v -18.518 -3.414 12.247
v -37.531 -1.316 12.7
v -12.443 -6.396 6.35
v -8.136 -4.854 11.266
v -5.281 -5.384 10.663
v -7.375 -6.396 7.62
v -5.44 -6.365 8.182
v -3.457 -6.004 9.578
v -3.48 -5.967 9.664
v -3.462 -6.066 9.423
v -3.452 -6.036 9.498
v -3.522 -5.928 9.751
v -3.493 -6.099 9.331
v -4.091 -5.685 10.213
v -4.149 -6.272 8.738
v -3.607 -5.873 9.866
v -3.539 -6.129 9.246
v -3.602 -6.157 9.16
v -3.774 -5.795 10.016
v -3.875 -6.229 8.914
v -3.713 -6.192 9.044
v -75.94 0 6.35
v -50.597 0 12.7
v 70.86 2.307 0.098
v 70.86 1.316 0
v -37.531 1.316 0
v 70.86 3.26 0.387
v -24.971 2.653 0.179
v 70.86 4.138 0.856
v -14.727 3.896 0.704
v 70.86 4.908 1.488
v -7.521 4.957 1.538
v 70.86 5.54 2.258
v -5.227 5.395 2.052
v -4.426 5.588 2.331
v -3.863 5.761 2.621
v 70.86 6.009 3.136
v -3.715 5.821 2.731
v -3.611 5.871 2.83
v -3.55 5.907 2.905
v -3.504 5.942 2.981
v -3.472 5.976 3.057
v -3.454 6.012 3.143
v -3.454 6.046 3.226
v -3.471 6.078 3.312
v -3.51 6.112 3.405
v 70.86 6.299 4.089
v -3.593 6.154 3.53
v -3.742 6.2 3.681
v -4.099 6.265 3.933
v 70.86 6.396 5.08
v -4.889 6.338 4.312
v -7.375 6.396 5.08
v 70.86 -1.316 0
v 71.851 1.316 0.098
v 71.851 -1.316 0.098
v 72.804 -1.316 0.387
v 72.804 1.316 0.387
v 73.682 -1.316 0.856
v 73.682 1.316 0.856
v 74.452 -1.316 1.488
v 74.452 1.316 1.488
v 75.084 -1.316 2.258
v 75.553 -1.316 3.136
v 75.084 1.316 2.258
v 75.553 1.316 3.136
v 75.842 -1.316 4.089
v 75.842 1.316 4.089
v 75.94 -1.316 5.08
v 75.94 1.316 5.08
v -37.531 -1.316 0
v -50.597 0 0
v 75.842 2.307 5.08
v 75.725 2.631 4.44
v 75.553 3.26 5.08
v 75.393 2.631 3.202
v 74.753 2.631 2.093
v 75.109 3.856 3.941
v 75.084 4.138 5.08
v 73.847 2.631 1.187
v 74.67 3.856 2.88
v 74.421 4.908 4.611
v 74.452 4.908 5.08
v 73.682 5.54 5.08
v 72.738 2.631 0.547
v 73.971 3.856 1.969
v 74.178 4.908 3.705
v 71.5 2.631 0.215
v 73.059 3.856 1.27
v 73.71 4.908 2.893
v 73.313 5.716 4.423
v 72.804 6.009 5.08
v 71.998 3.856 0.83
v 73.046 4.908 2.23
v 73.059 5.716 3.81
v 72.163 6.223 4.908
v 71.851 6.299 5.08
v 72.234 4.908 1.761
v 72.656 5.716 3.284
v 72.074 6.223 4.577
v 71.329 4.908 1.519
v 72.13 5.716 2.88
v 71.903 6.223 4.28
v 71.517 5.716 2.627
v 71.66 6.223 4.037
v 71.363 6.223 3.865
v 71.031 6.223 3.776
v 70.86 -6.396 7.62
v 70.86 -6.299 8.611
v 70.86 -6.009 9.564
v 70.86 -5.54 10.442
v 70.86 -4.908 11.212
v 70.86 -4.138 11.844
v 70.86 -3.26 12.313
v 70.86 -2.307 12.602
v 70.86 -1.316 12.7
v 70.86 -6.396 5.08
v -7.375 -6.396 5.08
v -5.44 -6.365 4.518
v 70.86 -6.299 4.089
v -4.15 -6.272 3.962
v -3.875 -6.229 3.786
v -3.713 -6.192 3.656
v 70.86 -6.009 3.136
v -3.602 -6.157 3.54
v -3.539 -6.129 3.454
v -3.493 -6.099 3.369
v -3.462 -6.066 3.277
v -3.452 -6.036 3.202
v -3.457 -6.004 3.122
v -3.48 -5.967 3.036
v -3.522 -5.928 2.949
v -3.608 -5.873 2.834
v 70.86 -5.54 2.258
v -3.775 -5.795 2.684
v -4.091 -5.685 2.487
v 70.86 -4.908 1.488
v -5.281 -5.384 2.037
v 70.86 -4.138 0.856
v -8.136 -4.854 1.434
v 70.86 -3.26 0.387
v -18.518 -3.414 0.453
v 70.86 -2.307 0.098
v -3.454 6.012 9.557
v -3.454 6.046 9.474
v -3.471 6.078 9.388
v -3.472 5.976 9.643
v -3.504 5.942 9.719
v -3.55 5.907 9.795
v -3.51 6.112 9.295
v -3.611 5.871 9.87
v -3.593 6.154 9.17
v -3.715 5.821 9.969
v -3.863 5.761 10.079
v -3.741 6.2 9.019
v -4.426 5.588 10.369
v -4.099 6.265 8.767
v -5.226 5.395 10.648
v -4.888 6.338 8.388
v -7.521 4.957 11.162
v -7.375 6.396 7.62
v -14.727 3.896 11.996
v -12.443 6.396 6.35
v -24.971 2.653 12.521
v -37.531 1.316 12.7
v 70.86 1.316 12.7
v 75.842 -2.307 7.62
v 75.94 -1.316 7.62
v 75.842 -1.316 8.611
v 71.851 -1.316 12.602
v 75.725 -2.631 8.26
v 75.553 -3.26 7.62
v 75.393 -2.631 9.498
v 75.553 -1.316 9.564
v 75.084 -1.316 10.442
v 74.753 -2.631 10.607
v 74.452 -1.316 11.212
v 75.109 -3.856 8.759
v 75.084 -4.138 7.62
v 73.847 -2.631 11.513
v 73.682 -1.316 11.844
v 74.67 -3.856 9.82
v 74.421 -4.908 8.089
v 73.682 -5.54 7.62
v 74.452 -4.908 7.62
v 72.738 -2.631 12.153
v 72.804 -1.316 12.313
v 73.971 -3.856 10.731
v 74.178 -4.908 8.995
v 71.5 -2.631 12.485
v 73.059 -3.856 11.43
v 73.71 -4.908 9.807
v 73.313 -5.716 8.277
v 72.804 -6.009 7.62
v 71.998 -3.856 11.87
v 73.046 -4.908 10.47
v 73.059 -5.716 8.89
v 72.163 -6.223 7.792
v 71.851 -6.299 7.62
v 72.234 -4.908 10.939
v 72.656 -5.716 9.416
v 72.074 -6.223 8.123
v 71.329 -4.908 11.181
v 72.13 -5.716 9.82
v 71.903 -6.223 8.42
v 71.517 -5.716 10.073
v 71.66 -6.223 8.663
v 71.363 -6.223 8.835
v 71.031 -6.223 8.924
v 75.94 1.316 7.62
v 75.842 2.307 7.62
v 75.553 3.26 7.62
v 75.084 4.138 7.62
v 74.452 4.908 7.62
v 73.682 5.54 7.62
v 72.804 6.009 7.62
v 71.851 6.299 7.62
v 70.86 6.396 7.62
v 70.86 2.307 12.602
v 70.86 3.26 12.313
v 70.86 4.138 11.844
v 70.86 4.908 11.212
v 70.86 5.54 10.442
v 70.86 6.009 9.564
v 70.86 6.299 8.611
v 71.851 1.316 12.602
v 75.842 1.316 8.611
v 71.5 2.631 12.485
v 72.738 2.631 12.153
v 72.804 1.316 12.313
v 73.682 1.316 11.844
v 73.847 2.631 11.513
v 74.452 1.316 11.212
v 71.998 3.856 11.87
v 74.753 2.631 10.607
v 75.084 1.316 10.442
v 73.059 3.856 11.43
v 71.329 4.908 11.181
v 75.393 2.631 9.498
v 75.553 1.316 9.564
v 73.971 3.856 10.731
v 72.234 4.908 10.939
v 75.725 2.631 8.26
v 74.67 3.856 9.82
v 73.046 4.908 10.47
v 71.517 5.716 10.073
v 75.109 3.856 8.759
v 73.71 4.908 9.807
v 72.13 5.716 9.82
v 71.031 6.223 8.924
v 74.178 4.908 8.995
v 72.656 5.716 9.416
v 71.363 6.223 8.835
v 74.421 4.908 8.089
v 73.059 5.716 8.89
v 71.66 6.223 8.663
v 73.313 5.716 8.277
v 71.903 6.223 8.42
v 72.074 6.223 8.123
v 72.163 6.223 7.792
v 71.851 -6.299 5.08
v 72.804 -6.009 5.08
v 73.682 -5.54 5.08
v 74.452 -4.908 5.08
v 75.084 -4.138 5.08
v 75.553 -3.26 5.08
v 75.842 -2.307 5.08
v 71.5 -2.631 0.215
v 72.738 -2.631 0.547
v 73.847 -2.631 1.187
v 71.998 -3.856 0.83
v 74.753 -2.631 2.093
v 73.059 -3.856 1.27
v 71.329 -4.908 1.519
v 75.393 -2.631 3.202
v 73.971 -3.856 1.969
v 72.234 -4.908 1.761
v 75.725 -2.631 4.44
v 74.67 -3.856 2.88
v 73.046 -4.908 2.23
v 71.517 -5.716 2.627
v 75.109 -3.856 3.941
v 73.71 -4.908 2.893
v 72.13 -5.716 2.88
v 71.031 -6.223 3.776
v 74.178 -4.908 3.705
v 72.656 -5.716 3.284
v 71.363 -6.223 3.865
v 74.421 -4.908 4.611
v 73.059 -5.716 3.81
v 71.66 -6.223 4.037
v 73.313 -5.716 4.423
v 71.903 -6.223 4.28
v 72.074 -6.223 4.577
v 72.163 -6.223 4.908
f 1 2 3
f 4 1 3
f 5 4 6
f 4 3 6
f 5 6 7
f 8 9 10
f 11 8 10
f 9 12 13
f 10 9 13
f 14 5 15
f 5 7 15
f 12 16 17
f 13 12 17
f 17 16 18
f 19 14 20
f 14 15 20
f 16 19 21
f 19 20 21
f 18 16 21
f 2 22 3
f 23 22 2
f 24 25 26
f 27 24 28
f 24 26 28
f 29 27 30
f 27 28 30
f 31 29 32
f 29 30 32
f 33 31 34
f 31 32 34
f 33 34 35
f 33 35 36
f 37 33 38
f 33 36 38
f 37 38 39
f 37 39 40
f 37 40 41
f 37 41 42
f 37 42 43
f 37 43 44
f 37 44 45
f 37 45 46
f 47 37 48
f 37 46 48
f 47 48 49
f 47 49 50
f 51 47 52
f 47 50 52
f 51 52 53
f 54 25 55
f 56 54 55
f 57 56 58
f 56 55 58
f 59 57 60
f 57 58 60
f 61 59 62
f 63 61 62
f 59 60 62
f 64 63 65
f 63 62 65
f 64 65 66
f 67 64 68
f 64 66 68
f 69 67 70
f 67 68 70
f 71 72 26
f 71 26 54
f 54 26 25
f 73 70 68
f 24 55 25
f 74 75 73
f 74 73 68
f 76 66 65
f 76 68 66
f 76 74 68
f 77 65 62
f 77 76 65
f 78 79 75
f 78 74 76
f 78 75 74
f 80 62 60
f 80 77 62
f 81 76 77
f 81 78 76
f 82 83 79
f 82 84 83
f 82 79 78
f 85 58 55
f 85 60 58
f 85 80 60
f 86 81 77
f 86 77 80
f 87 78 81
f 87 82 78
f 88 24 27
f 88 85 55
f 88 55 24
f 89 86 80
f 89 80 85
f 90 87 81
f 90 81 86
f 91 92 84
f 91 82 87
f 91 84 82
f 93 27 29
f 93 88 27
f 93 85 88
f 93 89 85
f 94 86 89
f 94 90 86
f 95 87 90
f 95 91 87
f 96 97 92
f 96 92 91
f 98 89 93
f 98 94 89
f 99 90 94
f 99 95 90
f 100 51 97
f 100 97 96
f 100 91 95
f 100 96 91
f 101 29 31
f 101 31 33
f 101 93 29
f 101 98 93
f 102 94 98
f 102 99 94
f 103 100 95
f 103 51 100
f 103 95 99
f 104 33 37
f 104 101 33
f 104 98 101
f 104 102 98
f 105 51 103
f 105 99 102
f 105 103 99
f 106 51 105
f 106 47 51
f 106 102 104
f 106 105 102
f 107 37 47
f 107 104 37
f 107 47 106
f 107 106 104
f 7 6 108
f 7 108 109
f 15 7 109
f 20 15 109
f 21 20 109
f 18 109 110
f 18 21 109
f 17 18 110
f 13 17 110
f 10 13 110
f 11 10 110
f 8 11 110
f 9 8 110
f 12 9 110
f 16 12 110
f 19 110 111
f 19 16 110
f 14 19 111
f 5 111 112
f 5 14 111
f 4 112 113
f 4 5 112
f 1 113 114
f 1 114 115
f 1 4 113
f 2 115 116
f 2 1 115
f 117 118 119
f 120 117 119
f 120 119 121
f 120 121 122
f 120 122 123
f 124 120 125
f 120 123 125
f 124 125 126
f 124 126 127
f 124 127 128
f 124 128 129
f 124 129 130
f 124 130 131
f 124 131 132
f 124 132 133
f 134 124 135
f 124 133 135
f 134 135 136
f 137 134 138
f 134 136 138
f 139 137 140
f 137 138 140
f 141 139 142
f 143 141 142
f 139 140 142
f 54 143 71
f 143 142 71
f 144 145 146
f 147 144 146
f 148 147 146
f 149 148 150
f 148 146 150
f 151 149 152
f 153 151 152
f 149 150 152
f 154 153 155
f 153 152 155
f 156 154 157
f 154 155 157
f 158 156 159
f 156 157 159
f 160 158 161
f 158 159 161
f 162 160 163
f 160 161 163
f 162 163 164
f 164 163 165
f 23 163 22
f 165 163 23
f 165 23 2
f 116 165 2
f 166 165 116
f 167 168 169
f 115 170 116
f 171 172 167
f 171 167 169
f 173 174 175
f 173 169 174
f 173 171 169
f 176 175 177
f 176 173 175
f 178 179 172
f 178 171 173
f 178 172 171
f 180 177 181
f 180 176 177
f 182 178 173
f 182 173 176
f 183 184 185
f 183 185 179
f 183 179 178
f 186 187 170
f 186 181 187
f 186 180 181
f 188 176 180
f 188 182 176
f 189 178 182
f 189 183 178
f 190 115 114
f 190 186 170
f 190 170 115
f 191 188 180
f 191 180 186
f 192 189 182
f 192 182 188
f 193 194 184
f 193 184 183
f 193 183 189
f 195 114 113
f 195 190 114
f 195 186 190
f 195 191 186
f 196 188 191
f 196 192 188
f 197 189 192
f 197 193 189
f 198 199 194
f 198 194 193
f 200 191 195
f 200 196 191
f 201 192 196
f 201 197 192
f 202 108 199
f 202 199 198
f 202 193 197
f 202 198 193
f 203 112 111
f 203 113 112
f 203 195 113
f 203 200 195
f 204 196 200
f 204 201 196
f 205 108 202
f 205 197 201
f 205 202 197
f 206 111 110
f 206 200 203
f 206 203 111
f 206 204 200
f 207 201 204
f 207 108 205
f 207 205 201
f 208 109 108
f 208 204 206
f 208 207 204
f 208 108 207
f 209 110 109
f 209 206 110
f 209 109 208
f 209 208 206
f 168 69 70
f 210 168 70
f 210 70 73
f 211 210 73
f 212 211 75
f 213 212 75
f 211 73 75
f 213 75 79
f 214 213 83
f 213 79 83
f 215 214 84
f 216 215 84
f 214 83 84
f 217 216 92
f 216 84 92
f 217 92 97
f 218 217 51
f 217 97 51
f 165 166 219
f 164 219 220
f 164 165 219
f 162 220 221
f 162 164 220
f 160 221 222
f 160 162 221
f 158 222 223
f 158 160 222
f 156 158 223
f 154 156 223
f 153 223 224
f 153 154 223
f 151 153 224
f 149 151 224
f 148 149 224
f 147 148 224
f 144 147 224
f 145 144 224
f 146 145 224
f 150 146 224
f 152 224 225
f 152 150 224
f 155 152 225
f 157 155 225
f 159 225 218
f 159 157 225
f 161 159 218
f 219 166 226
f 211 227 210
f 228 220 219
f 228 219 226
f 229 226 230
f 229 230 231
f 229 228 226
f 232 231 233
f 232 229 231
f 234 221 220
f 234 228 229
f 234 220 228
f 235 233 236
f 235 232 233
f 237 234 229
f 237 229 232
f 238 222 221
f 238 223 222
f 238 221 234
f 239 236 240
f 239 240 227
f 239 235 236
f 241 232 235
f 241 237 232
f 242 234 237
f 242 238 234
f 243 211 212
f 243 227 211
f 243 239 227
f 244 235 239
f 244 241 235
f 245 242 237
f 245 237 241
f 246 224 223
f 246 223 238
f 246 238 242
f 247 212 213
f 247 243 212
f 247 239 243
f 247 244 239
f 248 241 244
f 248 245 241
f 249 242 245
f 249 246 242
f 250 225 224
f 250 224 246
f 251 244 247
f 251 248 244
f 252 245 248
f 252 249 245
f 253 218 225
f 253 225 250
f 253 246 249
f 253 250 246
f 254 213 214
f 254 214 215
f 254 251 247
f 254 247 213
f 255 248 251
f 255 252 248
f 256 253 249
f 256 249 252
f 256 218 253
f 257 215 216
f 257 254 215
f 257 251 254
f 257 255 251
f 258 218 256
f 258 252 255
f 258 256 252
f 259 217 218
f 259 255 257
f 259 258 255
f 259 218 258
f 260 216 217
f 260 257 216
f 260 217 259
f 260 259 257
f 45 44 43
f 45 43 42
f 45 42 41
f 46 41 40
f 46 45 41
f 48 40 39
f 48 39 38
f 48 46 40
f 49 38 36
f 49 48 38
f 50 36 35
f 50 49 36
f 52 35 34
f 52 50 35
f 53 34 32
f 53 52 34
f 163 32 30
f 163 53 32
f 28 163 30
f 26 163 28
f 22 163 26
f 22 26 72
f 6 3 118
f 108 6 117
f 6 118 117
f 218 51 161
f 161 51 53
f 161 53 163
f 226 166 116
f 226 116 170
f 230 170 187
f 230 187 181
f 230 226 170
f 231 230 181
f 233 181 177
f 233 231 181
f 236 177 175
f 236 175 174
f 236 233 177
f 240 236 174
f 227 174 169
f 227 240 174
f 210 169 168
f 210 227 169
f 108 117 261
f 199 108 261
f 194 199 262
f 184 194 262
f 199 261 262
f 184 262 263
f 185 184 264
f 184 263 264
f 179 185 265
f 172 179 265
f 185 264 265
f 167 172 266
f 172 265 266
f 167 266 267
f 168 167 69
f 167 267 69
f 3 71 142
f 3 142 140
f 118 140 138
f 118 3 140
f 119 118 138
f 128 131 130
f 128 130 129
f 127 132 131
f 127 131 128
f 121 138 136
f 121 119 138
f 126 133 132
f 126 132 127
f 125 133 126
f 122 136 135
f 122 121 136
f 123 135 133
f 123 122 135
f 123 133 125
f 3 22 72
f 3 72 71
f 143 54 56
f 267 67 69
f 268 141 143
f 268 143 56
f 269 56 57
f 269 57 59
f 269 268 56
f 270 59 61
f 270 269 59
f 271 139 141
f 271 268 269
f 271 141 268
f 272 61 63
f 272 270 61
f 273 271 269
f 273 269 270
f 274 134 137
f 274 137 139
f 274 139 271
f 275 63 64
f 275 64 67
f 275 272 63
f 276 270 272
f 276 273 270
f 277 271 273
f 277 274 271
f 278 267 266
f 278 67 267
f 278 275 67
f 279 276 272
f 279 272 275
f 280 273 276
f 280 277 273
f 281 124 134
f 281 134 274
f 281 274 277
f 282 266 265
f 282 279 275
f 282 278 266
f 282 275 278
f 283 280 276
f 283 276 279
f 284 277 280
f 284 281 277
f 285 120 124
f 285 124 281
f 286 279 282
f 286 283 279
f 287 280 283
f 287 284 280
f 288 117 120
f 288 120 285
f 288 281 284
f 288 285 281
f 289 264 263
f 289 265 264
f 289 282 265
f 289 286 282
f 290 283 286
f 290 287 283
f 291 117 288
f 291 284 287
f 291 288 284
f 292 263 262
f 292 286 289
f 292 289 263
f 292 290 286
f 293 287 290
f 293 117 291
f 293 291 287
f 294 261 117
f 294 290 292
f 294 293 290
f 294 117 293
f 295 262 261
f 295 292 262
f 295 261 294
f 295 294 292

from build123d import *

# Parameters (mm, degrees)
F1_DEPTH     = 12.7
F2_SIZE2     = 6.35
F2_SIZE      = 2.54
F2_2_SIZE2   = 6.34999
F2_2_SIZE    = 2.53999
F3_T1_DEPTH  = 121.4602589597
F3_T3_DEPTH  = 121.4603587348
F3_T5_DEPTH  = 2.54
F3_T7_DEPTH  = 2.6322967076
F3_S11_W     = 5.08
F3_S11_H     = 5.08
F3_T12_DEPTH = 5.08
F3_S17_W     = 5.08
F3_S17_H     = 5.08
F3_T18_DEPTH = 5.08
F3_S23_W     = 5.08
F3_S23_H     = 5.08
F3_T24_DEPTH = 5.08
F3_S29_W     = 5.08
F3_S29_H     = 5.08
F3_T30_DEPTH = 5.08


# Not quite as in the source:
# - a fillet or chamfer that OpenCascade refuses, or shapes differently, is made with other operations: its cross-section is extruded or revolved along the edge and cut away or added
# - a fillet or chamfer is up to 0.001 mm smaller than in the source, because OpenCascade refuses the exact size


with BuildPart() as f1:
    # F0 (on Top) → F1 (new body)
    with BuildSketch(Plane.XY):
        Polygon((75.9397223592, -6.3961483538), (75.9397223592, 6.3961483538), (-12.4434158206, 6.3961483538), (-75.9397223592, 0), (-12.4434158206, -6.3961483538), align=None)
    extrude(amount=F1_DEPTH)

    # F2
    f2_edges = [f1.edges().sort_by_distance(p)[0] for p in [
        (-44.191569, -3.198074, 12.7),
        (-44.191569, 3.198074, 12.7),
    ]]
    f2_side = f1.faces().sort_by_distance((14.475683, 0, 12.7))[0]
    chamfer(f2_edges, length=F2_SIZE, length2=F2_SIZE2, reference=f2_side)

    # F2#2 (size 2.54 and 6.35 in the source; OpenCascade refuses exactly that, so slightly less here)
    f2_2_edges = [f1.edges().sort_by_distance(p)[0] for p in [
        (-44.191569, -3.198074, 0),
        (-44.191569, 3.198074, 0),
    ]]
    f2_2_side = f1.faces().sort_by_distance((14.475683, 0, 0))[0]
    chamfer(f2_2_edges, length=F2_2_SIZE, length2=F2_2_SIZE2, reference=f2_2_side)

    # F3: fillet of radius 5.08 on 8 edges, made by hand

    # F3_s2 → F3_t1 (cut)
    with BuildSketch(Plane.YZ.offset(-50.6005366005)):
        with BuildLine():
            ThreePointArc((-6.3961483538, 7.62), (-4.9082508022, 11.2121024484), (-1.3161483538, 12.7))
            Line((-1.3161483538, 12.7), (-6.3961483538, 12.7))
            Line((-6.3961483538, 12.7), (-6.3961483538, 7.62))
        make_face()
        with BuildLine():
            ThreePointArc((1.3161483538, 12.7), (4.9082508022, 11.2121024484), (6.3961483538, 7.62))
            Line((6.3961483538, 7.62), (6.3961483538, 12.7))
            Line((6.3961483538, 12.7), (1.3161483538, 12.7))
        make_face()
    extrude(amount=F3_T1_DEPTH, mode=Mode.SUBTRACT)

    # F3_s4 → F3_t3 (cut)
    with BuildSketch(Plane.YZ.offset(-50.6006363756)):
        with BuildLine():
            ThreePointArc((-6.3961483538, 5.08), (-4.9082508022, 1.4878975516), (-1.3161483538, 0))
            Line((-1.3161483538, 0), (-6.3961483538, 0))
            Line((-6.3961483538, 0), (-6.3961483538, 5.08))
        make_face()
        with BuildLine():
            ThreePointArc((1.3161483538, 0), (4.9082508022, 1.4878975516), (6.3961483538, 5.08))
            Line((6.3961483538, 5.08), (6.3961483538, 0))
            Line((6.3961483538, 0), (1.3161483538, 0))
        make_face()
    extrude(amount=F3_T3_DEPTH, mode=Mode.SUBTRACT)

    # F3_s6 → F3_t5 (cut)
    with BuildSketch(Plane.XY.offset(5.08)):
        with BuildLine():
            ThreePointArc((70.8597223592, -6.3961483538), (74.4518248076, -4.9082508022), (75.9397223592, -1.3161483538))
            Line((75.9397223592, -1.3161483538), (75.9397223592, -6.3961483538))
            Line((75.9397223592, -6.3961483538), (70.8597223592, -6.3961483538))
        make_face()
        with BuildLine():
            ThreePointArc((75.9397223592, 1.3161483538), (74.4518248076, 4.9082508022), (70.8597223592, 6.3961483538))
            Line((70.8597223592, 6.3961483538), (75.9397223592, 6.3961483538))
            Line((75.9397223592, 6.3961483538), (75.9397223592, 1.3161483538))
        make_face()
    extrude(amount=F3_T5_DEPTH, mode=Mode.SUBTRACT)

    # F3_s8 → F3_t7 (cut)
    with BuildSketch(Plane.XZ.offset(-1.3161483538)):
        with BuildLine():
            ThreePointArc((70.8597223592, 12.7), (74.4518248076, 11.2121024484), (75.9397223592, 7.62))
            Line((75.9397223592, 7.62), (75.9397223592, 12.7))
            Line((75.9397223592, 12.7), (70.8597223592, 12.7))
        make_face()
        with BuildLine():
            ThreePointArc((70.8597223592, 0), (74.4518248076, 1.4878975516), (75.9397223592, 5.08))
            Line((75.9397223592, 5.08), (75.9397223592, 0))
            Line((75.9397223592, 0), (70.8597223592, 0))
        make_face()
    extrude(amount=F3_T7_DEPTH, mode=Mode.SUBTRACT)


with BuildPart() as f3_tool10:
    # F3_s11 → F3_t12 (new body)
    with BuildSketch(Plane.XZ.offset(1.3161483538)):
        with Locations((73.3997223592, 10.16)):
            Rectangle(F3_S11_W, F3_S11_H)
    extrude(amount=F3_T12_DEPTH)

    # F3_s13 → F3_t14 (revolve, cut)
    with BuildSketch(Plane(origin=(70.8597223592, -1.3161483538, 7.62), x_dir=(-0.7071067812, 0, -0.7071067812), z_dir=(-0.7071067812, 0, 0.7071067812))):
        with BuildLine():
            ThreePointArc((0, -5.08), (5.08, 0), (0, 5.08))
            Line((0, 5.08), (0, -5.08))
        make_face()
    revolve(axis=Axis((70.8597223592, -1.3161483538, 7.62), (0, -1, 0)), mode=Mode.SUBTRACT)


with BuildPart() as f1_1:
    add(f1.part)

    # F3_t9: cut F3_tool10
    add(f3_tool10.part, mode=Mode.SUBTRACT)


with BuildPart() as f3_tool16:
    # F3_s17 → F3_t18 (new body)
    with BuildSketch(Plane.XZ.offset(1.3161483538)):
        with Locations((73.3997223592, 2.54)):
            Rectangle(F3_S17_W, F3_S17_H)
    extrude(amount=F3_T18_DEPTH)

    # F3_s19 → F3_t20 (revolve, cut)
    with BuildSketch(Plane(origin=(70.8597223592, -1.3161483538, 5.08), x_dir=(-0.7071067812, 0, 0.7071067812), z_dir=(0.7071067812, 0, 0.7071067812))):
        with BuildLine():
            ThreePointArc((0, -5.08), (5.08, 0), (0, 5.08))
            Line((0, 5.08), (0, -5.08))
        make_face()
    revolve(axis=Axis((70.8597223592, -1.3161483538, 5.08), (0, -1, 0)), mode=Mode.SUBTRACT)


with BuildPart() as f1_2:
    add(f1_1.part)

    # F3_t15: cut F3_tool16
    add(f3_tool16.part, mode=Mode.SUBTRACT)


with BuildPart() as f3_tool22:
    # F3_s23 → F3_t24 (new body)
    with BuildSketch(Plane.XZ.offset(-1.3161483538)):
        with Locations((73.3997223592, 2.54)):
            Rectangle(F3_S23_W, F3_S23_H)
    extrude(amount=-F3_T24_DEPTH)

    # F3_s25 → F3_t26 (revolve, cut)
    with BuildSketch(Plane(origin=(70.8597223592, 1.3161483538, 5.08), x_dir=(-0.7071067812, 0, 0.7071067812), z_dir=(-0.7071067812, 0, -0.7071067812))):
        with BuildLine():
            ThreePointArc((0, -5.08), (5.08, 0), (0, 5.08))
            Line((0, 5.08), (0, -5.08))
        make_face()
    revolve(axis=Axis((70.8597223592, 1.3161483538, 5.08), (0, 1, 0)), mode=Mode.SUBTRACT)


with BuildPart() as f1_3:
    add(f1_2.part)

    # F3_t21: cut F3_tool22
    add(f3_tool22.part, mode=Mode.SUBTRACT)


with BuildPart() as f3_tool28:
    # F3_s29 → F3_t30 (new body)
    with BuildSketch(Plane.XZ.offset(-1.3161483538)):
        with Locations((73.3997223592, 10.16)):
            Rectangle(F3_S29_W, F3_S29_H)
    extrude(amount=-F3_T30_DEPTH)

    # F3_s31 → F3_t32 (revolve, cut)
    with BuildSketch(Plane(origin=(70.8597223592, 1.3161483538, 7.62), x_dir=(-0.7071067812, 0, -0.7071067812), z_dir=(0.7071067812, 0, -0.7071067812))):
        with BuildLine():
            ThreePointArc((0, -5.08), (5.08, 0), (0, 5.08))
            Line((0, 5.08), (0, -5.08))
        make_face()
    revolve(axis=Axis((70.8597223592, 1.3161483538, 7.62), (0, 1, 0)), mode=Mode.SUBTRACT)


with BuildPart() as f1_4:
    add(f1_3.part)

    # F3_t27: cut F3_tool28
    add(f3_tool28.part, mode=Mode.SUBTRACT)


solid = f1_4.part
